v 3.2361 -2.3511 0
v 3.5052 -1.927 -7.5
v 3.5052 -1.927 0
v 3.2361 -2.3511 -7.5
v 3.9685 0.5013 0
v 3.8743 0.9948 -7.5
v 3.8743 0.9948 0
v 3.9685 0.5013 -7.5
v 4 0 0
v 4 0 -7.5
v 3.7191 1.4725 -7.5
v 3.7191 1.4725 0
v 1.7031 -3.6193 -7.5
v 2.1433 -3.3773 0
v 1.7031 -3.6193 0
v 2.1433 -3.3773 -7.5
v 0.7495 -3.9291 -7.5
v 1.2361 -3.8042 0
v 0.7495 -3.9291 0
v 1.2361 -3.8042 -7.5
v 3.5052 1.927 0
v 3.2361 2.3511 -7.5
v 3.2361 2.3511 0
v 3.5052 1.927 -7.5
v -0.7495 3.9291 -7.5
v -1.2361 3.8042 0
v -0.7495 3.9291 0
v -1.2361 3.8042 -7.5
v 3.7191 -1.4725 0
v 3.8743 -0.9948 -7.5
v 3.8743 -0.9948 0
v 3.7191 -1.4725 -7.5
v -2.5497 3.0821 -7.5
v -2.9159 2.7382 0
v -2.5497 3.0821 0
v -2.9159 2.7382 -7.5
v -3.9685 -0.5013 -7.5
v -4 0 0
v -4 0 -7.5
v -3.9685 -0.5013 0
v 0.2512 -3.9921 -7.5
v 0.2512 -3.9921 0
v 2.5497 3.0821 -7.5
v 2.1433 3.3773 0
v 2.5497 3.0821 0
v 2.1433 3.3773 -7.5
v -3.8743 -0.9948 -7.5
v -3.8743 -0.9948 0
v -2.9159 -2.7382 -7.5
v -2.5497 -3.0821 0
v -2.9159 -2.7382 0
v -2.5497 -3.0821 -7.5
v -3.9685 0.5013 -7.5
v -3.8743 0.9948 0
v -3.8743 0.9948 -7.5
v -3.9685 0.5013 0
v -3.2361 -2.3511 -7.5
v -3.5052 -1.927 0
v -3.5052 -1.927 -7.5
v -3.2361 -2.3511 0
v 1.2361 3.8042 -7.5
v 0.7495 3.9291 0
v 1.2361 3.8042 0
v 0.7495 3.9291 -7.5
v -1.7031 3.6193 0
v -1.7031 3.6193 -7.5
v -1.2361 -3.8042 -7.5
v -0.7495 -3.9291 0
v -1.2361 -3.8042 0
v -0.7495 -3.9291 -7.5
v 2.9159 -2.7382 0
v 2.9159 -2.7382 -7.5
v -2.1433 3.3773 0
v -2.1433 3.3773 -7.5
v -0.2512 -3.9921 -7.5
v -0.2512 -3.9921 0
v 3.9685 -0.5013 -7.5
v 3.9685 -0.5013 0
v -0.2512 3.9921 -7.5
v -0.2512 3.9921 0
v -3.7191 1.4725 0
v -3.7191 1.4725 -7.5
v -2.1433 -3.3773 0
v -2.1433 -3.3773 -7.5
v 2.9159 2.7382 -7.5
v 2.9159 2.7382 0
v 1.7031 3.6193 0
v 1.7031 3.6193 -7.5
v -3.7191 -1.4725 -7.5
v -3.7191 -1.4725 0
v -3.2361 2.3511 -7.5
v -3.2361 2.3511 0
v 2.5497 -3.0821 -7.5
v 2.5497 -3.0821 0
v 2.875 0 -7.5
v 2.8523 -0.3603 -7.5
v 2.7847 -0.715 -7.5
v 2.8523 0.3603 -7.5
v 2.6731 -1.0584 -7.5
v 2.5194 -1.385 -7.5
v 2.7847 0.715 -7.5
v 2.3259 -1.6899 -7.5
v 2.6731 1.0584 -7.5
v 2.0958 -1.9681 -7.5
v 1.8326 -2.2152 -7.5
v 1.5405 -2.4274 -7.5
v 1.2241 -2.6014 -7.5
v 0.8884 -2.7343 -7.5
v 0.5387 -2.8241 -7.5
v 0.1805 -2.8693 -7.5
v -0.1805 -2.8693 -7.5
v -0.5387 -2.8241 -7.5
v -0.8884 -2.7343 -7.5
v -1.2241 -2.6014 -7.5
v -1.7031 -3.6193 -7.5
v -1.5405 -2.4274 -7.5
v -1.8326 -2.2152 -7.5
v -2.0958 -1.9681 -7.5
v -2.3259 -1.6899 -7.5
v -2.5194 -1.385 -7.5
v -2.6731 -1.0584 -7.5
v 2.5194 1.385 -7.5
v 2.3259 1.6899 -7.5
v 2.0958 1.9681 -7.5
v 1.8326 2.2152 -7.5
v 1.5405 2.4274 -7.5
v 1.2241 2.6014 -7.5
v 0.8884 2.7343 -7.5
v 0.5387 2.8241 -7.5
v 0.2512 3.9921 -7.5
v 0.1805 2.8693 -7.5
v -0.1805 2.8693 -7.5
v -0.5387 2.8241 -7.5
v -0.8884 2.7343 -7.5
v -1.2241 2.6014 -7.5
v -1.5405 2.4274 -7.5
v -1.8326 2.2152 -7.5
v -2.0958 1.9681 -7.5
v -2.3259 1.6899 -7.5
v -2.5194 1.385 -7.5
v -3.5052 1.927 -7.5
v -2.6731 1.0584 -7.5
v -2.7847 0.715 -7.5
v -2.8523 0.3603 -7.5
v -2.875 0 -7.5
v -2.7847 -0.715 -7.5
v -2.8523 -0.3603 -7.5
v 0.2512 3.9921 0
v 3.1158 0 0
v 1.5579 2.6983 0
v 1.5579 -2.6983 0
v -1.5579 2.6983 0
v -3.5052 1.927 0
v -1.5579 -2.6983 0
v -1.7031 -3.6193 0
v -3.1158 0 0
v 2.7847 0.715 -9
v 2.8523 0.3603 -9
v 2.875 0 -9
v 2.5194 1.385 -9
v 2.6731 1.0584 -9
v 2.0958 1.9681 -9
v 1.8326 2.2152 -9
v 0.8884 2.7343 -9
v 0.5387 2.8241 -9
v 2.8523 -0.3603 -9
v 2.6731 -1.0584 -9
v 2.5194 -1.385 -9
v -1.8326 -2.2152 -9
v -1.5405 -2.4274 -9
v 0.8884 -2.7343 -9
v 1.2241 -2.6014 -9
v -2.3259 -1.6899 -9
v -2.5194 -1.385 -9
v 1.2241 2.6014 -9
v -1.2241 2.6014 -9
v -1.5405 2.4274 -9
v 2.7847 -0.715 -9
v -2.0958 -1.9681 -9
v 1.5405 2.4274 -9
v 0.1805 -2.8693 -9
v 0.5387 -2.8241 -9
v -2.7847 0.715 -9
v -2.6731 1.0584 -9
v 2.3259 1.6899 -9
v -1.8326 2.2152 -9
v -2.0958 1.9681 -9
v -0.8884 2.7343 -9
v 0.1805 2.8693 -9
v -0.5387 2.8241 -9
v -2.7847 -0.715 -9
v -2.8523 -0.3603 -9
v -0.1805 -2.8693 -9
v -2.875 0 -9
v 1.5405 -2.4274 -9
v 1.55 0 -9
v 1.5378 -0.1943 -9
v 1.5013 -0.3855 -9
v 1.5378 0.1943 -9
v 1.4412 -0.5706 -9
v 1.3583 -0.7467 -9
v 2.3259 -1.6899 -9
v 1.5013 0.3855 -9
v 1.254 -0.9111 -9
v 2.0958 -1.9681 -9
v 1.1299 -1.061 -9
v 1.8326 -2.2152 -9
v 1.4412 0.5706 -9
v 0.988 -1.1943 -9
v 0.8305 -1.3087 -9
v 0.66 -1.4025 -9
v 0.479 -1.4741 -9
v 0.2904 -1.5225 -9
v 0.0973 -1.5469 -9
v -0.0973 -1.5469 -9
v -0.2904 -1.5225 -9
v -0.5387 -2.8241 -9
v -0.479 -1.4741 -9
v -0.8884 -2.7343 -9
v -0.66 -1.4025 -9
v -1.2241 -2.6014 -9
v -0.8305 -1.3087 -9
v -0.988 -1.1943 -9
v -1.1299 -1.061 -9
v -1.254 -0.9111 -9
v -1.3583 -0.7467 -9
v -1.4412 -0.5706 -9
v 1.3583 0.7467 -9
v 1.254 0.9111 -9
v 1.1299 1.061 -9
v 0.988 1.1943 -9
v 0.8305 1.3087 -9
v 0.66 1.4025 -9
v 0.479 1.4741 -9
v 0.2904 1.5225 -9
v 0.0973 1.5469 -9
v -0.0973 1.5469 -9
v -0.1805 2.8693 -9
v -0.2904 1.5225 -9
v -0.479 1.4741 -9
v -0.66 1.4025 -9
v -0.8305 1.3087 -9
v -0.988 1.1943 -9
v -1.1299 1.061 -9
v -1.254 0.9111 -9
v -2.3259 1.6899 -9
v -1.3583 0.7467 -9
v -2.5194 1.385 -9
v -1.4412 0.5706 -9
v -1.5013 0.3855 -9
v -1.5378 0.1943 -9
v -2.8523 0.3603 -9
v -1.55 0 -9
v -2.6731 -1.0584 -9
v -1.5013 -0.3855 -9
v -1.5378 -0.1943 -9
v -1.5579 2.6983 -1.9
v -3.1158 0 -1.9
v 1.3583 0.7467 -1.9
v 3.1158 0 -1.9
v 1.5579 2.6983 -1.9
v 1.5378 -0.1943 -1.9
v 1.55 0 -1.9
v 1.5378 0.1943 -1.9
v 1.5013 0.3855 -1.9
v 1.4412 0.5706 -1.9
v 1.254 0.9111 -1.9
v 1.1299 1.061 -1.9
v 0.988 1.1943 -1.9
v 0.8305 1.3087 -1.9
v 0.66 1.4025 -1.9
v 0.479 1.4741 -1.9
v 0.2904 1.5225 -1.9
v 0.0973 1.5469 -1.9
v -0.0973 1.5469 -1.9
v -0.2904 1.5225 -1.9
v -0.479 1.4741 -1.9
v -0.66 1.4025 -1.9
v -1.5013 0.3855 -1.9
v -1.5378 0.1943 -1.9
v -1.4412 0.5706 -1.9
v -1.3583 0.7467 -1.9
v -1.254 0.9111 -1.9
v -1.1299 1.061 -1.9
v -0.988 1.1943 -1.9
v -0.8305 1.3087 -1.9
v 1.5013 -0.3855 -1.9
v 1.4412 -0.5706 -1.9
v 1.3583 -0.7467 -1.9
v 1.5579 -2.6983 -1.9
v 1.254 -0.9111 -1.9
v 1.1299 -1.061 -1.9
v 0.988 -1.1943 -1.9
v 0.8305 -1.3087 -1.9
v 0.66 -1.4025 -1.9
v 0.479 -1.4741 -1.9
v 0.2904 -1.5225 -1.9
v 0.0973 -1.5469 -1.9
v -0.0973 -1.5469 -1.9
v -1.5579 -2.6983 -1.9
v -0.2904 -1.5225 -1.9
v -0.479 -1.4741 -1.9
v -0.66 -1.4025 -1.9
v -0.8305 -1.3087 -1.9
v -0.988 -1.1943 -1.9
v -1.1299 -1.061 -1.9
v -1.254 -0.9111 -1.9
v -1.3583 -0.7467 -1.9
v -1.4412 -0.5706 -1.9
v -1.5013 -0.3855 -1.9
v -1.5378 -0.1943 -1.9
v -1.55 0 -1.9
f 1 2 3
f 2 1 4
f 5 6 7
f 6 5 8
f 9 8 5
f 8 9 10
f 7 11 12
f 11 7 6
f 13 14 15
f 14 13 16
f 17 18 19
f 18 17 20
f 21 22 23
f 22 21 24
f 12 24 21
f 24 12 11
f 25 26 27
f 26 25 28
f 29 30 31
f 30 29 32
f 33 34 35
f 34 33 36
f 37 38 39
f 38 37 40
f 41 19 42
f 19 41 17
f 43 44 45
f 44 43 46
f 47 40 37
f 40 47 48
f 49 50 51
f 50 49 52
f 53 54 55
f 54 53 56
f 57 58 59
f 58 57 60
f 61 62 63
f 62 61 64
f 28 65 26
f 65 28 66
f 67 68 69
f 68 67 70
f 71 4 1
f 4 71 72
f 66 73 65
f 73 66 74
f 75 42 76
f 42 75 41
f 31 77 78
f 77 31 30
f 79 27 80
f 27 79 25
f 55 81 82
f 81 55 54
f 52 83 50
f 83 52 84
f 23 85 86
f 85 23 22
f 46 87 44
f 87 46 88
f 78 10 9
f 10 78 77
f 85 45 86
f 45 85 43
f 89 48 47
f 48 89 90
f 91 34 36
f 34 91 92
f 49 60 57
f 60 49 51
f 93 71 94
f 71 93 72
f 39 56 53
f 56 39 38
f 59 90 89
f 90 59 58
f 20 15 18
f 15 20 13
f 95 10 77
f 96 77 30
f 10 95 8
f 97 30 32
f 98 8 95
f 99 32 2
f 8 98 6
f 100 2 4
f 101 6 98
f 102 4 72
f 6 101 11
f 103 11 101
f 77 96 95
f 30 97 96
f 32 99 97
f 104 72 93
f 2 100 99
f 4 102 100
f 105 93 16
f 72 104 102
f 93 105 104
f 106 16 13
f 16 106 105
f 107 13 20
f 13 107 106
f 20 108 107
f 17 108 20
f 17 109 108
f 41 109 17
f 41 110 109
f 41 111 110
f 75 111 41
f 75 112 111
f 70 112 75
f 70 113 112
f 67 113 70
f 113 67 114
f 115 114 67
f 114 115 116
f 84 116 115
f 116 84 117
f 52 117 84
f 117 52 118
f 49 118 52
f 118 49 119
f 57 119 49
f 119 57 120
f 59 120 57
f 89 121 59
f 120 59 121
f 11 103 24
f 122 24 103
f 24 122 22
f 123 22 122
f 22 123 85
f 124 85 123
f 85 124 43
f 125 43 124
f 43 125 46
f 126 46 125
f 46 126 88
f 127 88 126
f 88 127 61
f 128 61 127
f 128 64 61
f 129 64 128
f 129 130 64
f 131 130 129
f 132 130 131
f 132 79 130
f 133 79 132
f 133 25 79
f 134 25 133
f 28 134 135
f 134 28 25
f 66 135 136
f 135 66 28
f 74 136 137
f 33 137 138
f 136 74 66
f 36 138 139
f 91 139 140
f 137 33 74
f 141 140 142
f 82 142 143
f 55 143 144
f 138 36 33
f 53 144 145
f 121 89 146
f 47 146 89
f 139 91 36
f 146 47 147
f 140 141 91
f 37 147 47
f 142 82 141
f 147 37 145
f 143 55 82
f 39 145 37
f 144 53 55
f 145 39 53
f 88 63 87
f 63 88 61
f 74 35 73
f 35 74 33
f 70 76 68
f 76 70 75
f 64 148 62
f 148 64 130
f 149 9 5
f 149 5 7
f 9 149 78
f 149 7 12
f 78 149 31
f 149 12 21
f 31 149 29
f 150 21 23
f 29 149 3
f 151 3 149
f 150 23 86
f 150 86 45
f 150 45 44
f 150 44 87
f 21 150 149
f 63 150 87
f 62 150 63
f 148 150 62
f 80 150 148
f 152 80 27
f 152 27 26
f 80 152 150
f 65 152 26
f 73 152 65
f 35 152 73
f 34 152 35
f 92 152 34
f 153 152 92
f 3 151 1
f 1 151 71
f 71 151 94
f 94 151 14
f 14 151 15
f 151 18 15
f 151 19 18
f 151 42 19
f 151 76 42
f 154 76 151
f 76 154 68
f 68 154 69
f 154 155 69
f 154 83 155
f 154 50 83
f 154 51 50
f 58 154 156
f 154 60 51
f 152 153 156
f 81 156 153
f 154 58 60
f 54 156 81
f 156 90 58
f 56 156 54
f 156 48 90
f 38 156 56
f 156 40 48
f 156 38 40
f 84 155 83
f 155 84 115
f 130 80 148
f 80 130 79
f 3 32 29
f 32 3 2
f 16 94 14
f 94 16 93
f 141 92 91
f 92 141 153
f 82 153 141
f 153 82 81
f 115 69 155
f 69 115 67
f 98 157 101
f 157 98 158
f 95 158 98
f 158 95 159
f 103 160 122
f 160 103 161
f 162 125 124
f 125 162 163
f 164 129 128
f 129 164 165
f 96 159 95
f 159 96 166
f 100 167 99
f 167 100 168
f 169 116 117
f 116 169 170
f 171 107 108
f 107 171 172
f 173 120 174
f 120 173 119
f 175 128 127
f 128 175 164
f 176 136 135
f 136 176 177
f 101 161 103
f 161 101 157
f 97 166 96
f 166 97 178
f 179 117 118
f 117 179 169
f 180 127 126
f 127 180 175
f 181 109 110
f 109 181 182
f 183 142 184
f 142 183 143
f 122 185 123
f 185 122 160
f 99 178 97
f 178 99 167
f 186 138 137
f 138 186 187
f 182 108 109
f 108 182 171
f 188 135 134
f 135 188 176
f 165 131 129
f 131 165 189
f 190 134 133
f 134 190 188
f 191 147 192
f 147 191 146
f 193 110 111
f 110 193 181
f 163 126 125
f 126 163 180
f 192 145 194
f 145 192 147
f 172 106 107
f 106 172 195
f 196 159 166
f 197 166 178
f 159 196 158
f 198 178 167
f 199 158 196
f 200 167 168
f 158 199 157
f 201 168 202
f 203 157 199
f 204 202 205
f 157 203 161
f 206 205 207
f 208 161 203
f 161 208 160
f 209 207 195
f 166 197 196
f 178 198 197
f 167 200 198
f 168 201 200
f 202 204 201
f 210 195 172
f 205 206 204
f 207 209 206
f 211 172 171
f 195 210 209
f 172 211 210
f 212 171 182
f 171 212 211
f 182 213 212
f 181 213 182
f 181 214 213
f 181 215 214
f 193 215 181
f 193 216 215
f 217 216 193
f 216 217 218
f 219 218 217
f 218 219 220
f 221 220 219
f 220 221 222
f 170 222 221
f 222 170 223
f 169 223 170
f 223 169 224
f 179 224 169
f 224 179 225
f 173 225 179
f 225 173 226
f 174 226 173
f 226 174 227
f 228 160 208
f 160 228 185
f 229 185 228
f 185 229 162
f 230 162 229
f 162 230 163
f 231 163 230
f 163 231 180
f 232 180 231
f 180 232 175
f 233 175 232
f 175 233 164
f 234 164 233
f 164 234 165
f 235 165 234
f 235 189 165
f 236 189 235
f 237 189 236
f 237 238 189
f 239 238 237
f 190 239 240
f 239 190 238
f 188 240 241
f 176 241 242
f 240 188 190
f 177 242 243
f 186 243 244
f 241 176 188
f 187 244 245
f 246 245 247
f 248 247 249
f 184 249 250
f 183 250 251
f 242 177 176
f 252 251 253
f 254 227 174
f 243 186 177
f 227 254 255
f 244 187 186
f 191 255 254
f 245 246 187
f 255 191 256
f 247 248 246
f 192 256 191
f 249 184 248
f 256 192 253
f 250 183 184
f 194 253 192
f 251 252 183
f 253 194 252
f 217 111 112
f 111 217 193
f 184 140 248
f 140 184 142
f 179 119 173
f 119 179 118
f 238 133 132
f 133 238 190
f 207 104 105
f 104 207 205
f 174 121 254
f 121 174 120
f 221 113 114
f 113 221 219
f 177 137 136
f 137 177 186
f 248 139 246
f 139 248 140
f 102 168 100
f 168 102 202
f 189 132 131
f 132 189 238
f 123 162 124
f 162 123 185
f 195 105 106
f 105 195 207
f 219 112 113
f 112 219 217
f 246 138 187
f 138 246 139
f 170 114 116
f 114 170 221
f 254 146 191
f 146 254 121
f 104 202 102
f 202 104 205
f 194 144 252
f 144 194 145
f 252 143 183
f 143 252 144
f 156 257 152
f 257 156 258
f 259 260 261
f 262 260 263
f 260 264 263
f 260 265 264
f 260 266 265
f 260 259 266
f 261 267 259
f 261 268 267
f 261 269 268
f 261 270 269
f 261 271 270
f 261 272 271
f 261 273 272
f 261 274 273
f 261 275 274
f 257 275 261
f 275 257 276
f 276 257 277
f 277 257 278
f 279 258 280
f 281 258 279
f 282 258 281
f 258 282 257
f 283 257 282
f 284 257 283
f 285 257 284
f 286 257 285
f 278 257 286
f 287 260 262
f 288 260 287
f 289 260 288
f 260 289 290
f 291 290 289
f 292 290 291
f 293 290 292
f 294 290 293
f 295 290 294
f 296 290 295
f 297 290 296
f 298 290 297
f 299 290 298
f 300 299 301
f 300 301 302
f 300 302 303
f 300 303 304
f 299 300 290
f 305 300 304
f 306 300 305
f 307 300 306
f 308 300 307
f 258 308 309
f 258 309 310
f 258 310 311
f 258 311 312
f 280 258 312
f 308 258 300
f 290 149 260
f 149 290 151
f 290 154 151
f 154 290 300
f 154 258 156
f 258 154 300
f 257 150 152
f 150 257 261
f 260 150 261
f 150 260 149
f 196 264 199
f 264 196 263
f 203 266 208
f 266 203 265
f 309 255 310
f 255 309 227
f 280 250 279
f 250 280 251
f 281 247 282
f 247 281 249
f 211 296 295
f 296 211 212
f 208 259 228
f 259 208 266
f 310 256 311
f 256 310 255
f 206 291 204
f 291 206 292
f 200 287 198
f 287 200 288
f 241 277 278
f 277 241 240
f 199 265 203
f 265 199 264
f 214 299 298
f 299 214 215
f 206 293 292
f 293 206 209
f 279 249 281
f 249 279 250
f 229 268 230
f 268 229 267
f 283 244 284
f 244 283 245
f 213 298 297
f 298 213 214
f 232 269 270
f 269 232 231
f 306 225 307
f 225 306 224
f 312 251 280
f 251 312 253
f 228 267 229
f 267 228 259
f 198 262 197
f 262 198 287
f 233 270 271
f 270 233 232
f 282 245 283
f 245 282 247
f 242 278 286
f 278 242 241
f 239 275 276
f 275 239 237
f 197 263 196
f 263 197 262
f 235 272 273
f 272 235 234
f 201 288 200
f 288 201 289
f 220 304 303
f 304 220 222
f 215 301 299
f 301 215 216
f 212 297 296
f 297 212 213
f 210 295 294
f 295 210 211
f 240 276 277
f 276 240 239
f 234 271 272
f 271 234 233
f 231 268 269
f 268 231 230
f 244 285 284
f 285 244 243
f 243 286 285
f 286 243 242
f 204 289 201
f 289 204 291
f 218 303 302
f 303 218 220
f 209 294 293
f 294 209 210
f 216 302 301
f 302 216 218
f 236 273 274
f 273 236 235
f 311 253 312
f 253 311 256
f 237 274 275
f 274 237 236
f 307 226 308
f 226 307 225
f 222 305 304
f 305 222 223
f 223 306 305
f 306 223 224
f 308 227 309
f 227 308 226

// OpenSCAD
$fn = 50;

difference() {
	union() {
		translate(v = [0, 0, -7.5]) {
			cylinder(h = 7.5, r = 4.0);
		}
		#translate(v = [0, 0, -9.0]) {
			cylinder(h = 9, r = 2.875);
		}
	}
	union() {
		translate(v = [0, 0, 0]) {
			rotate(a = [0, 0, 0]) {
				difference() {
					union() {
						translate(v = [0, 0, -1.9]) {
							linear_extrude(height = 1.9) {
								polygon(points = [[3.1158, 0.0], [1.5579000000000005, 2.698361953111554], [-1.5578999999999994, 2.6983619531115544], [-3.1158, 3.815754496783323e-16], [-1.5579000000000014, -2.6983619531115535], [1.557899999999998, -2.6983619531115552]]);
							}
						}
					}
					union();
				}
			}
		}
		#translate(v = [0, 0, -100.0]) {
			cylinder(h = 200, r = 1.55);
		}
	}
}
